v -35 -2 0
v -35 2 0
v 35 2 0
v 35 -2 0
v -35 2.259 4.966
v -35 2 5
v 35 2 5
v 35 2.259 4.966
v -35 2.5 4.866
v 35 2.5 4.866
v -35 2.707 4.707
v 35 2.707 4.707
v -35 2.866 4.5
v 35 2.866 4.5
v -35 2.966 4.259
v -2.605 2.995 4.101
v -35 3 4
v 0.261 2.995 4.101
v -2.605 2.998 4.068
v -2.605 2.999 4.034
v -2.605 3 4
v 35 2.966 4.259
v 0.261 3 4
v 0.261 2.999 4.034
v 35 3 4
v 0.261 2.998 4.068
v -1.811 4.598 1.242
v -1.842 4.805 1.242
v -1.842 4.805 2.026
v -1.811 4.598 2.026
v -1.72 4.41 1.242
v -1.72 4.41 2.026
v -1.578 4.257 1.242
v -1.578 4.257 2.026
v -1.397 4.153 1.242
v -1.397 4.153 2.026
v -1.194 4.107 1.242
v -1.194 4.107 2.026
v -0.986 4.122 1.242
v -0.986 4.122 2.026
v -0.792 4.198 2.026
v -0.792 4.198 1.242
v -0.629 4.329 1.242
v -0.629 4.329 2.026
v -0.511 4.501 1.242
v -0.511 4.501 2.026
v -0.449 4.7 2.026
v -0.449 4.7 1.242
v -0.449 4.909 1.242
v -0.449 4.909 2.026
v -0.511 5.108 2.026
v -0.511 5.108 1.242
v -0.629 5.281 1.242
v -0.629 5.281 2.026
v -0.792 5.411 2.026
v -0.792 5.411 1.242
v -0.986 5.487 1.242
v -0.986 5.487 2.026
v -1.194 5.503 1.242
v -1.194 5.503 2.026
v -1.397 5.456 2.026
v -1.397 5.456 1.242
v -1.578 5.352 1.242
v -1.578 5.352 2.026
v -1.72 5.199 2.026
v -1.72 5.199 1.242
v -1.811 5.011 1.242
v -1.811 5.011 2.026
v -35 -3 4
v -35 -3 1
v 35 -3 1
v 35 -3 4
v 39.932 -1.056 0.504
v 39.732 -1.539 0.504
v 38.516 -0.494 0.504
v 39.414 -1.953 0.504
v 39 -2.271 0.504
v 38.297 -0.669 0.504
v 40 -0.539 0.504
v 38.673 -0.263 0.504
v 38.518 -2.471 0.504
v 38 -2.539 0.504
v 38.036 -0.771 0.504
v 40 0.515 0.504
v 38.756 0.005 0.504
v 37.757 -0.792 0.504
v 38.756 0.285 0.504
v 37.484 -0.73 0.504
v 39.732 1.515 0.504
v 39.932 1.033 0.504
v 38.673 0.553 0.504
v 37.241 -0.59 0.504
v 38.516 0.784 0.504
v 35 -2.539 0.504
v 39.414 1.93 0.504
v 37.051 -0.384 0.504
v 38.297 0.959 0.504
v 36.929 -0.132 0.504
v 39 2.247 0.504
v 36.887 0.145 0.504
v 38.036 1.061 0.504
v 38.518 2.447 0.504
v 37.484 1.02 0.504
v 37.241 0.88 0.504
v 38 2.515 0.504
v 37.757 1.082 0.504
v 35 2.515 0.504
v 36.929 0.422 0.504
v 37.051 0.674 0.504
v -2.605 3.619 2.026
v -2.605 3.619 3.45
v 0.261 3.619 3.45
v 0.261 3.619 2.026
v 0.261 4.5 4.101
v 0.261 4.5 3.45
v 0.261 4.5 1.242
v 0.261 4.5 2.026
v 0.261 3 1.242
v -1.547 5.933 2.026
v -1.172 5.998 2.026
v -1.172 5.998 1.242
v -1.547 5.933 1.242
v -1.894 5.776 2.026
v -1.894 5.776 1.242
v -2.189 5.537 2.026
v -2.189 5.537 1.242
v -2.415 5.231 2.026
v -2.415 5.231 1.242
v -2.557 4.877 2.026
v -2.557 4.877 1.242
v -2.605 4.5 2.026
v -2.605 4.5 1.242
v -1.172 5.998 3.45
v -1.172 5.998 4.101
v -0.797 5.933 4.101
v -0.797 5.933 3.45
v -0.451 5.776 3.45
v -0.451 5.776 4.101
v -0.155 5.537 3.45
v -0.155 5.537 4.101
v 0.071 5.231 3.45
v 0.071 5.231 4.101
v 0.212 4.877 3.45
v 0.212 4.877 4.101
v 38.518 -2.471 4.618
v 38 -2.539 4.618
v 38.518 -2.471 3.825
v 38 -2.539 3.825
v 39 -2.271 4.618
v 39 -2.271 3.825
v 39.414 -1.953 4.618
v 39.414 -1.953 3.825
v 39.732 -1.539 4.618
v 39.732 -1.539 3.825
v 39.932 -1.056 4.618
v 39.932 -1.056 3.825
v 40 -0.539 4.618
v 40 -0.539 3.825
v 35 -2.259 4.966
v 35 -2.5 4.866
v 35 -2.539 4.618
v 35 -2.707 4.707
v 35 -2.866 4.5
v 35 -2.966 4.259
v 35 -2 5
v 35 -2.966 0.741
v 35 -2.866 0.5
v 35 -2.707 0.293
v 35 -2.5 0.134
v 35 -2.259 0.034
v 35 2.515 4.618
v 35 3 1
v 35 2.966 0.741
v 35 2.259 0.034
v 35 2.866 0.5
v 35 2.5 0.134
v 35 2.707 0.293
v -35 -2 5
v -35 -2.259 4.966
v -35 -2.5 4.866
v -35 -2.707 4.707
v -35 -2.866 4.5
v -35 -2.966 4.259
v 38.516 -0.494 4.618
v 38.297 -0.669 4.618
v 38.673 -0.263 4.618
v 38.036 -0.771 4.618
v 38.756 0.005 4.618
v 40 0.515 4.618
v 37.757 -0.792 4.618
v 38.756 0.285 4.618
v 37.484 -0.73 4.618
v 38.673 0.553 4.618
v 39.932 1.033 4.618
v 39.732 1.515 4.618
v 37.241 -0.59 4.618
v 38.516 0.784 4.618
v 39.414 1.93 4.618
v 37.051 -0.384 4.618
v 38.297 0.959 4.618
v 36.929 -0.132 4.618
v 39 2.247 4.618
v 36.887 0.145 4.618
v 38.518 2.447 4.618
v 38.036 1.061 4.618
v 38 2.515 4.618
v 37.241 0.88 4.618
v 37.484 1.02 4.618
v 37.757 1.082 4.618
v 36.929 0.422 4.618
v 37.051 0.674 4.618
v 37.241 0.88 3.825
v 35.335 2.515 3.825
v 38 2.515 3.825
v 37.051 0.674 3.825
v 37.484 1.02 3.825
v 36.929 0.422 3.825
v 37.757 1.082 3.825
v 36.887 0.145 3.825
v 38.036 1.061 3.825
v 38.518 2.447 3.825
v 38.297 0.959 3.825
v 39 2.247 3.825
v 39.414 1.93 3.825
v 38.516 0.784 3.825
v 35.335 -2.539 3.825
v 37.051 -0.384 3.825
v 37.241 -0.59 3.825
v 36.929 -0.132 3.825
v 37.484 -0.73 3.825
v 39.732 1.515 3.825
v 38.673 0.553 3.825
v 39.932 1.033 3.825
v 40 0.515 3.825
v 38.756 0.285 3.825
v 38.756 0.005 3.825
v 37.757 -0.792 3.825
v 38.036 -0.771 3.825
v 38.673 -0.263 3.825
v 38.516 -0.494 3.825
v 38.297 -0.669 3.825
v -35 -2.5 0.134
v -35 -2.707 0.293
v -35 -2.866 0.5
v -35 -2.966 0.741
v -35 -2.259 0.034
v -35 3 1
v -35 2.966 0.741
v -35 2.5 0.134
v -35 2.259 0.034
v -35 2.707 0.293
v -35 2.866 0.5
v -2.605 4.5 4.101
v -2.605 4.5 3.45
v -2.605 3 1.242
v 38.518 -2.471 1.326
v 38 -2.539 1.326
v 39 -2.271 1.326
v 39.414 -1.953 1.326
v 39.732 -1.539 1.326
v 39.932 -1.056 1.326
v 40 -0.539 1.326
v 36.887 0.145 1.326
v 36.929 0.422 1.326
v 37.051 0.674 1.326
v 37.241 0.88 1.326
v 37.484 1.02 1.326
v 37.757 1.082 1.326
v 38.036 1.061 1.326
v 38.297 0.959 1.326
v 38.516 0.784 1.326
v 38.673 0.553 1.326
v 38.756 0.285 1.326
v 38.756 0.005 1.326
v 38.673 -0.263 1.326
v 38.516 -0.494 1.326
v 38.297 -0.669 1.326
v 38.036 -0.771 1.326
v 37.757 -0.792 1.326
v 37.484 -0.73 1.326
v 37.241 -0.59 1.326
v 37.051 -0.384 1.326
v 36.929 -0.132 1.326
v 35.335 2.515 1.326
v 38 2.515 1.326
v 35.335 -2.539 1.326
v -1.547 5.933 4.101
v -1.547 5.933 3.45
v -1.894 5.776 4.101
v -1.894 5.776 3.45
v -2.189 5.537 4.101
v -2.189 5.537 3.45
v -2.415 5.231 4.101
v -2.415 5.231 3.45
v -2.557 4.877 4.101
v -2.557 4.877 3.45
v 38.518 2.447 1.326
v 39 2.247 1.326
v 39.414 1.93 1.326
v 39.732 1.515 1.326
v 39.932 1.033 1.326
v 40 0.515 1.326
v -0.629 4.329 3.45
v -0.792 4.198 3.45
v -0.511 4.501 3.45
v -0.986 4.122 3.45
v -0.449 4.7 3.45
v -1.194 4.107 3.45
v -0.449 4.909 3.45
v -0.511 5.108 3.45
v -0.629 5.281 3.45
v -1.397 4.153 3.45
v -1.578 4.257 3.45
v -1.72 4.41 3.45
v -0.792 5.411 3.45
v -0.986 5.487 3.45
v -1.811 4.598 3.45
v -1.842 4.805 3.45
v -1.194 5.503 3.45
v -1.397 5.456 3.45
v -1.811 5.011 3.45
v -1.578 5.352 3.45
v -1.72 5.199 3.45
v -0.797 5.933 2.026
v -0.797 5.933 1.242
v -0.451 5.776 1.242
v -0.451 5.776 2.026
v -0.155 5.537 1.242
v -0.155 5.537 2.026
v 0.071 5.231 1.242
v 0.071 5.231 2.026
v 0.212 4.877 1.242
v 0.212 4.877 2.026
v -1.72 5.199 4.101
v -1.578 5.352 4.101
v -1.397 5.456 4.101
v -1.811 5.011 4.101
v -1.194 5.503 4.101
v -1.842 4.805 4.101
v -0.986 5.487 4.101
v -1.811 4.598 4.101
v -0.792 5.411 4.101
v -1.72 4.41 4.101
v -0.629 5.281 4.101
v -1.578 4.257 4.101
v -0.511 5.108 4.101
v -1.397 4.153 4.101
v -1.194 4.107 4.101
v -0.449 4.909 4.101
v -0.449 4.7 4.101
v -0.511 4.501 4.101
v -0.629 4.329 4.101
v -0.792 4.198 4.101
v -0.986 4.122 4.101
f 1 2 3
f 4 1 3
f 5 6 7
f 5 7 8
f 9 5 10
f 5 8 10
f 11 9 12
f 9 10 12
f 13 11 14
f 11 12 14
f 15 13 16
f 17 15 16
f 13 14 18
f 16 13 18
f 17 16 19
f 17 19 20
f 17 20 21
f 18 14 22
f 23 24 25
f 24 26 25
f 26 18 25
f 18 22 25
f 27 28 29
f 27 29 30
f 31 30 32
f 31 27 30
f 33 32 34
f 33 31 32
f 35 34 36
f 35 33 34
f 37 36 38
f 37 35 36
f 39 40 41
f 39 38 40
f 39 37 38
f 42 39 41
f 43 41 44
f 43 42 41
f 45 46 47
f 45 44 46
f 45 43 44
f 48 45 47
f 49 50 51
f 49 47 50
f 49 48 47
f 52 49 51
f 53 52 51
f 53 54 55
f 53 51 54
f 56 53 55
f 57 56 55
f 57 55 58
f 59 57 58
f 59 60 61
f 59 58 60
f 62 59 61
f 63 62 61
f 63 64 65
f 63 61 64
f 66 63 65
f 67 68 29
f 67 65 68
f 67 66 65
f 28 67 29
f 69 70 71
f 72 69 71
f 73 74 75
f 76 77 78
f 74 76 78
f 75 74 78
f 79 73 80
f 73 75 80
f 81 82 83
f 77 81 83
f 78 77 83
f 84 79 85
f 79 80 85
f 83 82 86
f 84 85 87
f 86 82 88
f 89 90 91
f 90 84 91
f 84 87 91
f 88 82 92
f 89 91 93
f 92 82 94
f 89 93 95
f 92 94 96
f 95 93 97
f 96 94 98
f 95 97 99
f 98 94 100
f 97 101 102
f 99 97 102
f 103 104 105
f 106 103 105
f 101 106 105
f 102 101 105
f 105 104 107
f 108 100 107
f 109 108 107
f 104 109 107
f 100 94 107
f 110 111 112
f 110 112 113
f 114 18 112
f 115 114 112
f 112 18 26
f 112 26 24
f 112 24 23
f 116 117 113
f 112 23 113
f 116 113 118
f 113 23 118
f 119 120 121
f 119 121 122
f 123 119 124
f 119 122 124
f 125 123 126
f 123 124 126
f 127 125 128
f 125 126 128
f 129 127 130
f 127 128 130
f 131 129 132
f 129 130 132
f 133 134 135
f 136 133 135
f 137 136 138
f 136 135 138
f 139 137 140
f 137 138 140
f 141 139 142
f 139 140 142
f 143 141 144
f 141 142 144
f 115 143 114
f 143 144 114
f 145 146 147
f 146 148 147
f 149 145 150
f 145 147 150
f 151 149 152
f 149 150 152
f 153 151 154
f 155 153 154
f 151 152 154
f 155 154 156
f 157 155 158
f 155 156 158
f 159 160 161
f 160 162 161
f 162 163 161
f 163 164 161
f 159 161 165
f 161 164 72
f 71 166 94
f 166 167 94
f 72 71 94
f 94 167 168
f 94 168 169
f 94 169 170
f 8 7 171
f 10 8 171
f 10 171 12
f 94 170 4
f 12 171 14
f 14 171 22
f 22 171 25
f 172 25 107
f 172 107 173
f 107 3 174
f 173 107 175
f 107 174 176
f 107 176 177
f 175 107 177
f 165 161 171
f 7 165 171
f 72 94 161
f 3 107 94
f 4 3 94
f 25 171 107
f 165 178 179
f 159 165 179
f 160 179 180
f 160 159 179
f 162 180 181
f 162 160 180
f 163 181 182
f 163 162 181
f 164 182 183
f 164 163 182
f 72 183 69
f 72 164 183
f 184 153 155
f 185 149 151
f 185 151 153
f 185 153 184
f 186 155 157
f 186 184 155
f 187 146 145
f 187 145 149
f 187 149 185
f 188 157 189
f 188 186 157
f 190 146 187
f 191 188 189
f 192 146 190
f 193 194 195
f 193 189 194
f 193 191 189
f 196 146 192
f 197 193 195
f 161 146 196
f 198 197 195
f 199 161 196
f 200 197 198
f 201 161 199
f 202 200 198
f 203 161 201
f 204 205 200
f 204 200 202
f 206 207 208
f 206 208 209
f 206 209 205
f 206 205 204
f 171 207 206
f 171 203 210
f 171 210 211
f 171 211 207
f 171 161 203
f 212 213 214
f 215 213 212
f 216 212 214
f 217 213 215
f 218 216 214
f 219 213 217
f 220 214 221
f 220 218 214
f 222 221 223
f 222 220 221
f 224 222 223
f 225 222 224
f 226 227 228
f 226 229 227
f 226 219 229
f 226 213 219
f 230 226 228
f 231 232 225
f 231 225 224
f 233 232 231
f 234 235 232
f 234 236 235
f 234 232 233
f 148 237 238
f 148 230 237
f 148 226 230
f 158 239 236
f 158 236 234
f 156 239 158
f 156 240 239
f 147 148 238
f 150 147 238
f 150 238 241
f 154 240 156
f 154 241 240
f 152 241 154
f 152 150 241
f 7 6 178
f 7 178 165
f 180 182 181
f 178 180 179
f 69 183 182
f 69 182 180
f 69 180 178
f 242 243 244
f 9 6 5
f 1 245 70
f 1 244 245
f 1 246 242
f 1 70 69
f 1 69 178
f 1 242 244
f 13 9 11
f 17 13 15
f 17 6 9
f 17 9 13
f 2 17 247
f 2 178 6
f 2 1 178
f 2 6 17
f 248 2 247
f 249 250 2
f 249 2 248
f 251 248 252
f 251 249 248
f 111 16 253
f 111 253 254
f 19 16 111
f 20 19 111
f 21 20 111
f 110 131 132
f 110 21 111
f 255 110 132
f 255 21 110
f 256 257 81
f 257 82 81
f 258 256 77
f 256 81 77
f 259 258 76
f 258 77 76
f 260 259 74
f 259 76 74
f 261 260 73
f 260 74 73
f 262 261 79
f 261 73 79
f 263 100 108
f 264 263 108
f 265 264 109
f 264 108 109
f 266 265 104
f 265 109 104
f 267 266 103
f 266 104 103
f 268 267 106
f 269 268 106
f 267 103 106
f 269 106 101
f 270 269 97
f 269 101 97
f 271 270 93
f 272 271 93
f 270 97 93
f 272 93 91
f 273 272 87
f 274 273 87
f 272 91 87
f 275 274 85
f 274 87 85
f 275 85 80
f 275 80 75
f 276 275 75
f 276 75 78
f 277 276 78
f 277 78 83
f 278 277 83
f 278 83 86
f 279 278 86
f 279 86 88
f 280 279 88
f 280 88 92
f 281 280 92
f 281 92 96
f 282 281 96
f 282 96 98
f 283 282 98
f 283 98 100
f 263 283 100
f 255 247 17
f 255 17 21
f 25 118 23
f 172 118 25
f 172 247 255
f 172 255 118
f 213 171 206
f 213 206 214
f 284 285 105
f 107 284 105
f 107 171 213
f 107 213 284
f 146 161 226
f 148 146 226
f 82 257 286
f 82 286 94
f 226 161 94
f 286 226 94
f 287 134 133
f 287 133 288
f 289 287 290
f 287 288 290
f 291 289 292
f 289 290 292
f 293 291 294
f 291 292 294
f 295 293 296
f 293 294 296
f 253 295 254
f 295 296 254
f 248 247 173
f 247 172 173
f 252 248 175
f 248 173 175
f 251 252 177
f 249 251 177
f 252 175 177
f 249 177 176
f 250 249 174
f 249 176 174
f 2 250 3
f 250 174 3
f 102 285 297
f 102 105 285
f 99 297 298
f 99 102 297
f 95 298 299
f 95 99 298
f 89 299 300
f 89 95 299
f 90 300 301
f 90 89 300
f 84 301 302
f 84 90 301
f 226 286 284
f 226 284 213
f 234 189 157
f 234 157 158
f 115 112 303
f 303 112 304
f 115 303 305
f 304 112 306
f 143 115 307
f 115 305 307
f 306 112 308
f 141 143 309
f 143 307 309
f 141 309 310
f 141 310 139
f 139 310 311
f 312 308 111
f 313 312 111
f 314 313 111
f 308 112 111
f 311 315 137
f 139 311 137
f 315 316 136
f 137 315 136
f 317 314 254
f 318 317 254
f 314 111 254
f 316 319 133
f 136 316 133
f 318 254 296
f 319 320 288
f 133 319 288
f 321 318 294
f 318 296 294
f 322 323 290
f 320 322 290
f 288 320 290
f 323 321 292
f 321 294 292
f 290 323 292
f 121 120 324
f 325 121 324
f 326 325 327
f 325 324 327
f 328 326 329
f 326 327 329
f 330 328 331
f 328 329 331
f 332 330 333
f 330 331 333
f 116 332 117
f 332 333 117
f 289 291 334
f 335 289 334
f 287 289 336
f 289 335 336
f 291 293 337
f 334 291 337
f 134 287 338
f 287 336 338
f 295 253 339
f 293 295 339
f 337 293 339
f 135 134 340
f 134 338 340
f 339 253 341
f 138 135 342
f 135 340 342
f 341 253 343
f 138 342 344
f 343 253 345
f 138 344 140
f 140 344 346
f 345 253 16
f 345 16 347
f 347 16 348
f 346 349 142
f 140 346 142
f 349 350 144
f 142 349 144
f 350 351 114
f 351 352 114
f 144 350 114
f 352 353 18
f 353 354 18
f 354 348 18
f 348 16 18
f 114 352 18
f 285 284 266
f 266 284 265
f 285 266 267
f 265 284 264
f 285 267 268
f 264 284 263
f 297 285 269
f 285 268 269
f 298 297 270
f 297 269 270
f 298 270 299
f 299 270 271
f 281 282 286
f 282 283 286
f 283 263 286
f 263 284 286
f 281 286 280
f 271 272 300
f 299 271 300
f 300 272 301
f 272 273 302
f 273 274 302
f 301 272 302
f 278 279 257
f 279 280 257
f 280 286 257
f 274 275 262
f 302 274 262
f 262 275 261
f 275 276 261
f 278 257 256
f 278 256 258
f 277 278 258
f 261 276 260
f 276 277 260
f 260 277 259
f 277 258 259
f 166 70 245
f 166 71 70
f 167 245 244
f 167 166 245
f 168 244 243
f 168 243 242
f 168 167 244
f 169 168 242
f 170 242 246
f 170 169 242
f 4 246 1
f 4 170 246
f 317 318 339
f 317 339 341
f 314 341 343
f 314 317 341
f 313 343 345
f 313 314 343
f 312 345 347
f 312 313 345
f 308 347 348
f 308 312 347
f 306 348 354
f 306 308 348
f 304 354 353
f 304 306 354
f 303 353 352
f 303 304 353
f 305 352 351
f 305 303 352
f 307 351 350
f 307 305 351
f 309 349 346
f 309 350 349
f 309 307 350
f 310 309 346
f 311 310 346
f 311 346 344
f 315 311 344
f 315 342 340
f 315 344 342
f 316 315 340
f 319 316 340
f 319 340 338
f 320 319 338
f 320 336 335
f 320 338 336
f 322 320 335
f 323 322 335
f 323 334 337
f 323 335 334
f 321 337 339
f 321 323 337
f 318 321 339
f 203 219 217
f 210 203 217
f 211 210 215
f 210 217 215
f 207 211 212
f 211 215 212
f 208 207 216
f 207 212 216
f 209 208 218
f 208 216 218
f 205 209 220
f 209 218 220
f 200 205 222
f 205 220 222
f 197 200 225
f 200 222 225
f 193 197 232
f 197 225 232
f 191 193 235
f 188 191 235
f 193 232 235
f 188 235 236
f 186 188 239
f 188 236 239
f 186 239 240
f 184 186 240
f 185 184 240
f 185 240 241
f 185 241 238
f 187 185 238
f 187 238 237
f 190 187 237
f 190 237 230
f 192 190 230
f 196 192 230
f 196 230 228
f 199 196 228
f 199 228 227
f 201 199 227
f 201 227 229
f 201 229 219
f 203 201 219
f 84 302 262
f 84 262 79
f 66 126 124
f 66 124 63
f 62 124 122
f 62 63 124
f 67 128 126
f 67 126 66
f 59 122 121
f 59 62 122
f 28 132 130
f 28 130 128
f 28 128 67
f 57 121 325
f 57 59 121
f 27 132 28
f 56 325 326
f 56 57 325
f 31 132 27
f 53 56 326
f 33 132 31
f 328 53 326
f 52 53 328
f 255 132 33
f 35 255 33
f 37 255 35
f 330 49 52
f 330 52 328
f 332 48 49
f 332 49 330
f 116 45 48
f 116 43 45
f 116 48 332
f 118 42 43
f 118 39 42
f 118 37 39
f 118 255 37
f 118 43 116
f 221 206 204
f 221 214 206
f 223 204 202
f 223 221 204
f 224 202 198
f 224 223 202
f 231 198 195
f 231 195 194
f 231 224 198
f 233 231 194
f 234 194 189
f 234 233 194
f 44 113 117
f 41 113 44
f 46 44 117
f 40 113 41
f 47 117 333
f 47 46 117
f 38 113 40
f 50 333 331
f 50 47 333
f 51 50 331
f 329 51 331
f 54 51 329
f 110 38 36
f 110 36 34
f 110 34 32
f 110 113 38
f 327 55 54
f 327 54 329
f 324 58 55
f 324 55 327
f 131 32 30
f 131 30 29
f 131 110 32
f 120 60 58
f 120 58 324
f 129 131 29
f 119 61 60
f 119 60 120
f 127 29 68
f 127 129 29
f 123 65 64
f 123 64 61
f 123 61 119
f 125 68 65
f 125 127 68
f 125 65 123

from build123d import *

# Parameters (mm, degrees)
SKETCH1_W               = 70
SKETCH1_H               = 6
BOSS_EXTRUDE1_DEPTH     = 5
SKETCH5_W               = 4.113429611
SKETCH5_H               = 5.054148352
BOSS_EXTRUDE4_DEPTH     = 40
SKETCH9_W               = 5.188919622
SKETCH9_H               = 2.498562964
CUT_EXTRUDE6_DEPTH      = 6
FILLET14_R              = 1
FILLET15_R              = 1
SKETCH11_R              = 0.939549209
CUT_EXTRUDE8_DEPTH      = 6
FILLET19_R              = 2
SKETCH12_W              = 2.865541581
SKETCH12_H              = 2.859268941
BOSS_EXTRUDE5_DEPTH     = 6
CUT_EXTRUDE9_DEPTH      = 12
CUT_EXTRUDE9_DEPTH_BACK = 5
SKETCH13_W              = 1.424860979
SKETCH13_H              = 2.636738839
SKETCH14_R              = 0.7
CUT_EXTRUDE10_DEPTH     = 13
FILLET20_R              = 1.5


with BuildPart() as part:
    # Sketch1 → Boss-Extrude1 (new body)
    with BuildSketch(Plane.XY):
        Rectangle(SKETCH1_W, SKETCH1_H)
    extrude(amount=BOSS_EXTRUDE1_DEPTH)

    # Sketch5 → Boss-Extrude4 (add)
    with BuildSketch(Plane(origin=(0, 0, 0), x_dir=(0, 0, -1), z_dir=(1, 0, 0))):
        with Locations((-2.56083925, -0.011702819)):
            Rectangle(SKETCH5_W, SKETCH5_H)
    extrude(amount=BOSS_EXTRUDE4_DEPTH)

    # Sketch9 → Cut-Extrude6 (cut)
    with BuildSketch(Plane.XZ.offset(2.538776995)):
        with Locations((37.929941449, 2.575384926)):
            Rectangle(SKETCH9_W, SKETCH9_H)
    extrude(amount=-CUT_EXTRUDE6_DEPTH, mode=Mode.SUBTRACT)

    # Fillet14
    fillet14_edges = [part.edges().sort_by_distance(p)[0] for p in [
        (0, 3, 5),
    ]]
    fillet(fillet14_edges, radius=FILLET14_R)

    # Fillet15
    fillet15_edges = [part.edges().sort_by_distance(p)[0] for p in [
        (0, -3, 5),
        (0, -3, 0),
        (0, 3, 0),
    ]]
    fillet(fillet15_edges, radius=FILLET15_R)

    # Sketch11 → Cut-Extrude8 (cut)
    with BuildSketch(Plane(origin=(0, 0, 0.504124444), x_dir=(-1, 0, 0), z_dir=(0, 0, -1))):
        with Locations((-37.826949183, 0.145030674)):
            Circle(SKETCH11_R)
    extrude(amount=-CUT_EXTRUDE8_DEPTH, mode=Mode.SUBTRACT)

    # Fillet19
    fillet19_edges = [part.edges().sort_by_distance(p)[0] for p in [
        (40, 2.515371357, 0.915113944),
        (40, -2.538776995, 4.221110231),
        (40, 2.515371357, 4.221110231),
        (40, -2.538776995, 0.915113944),
    ]]
    fillet(fillet19_edges, radius=FILLET19_R)

    # Sketch12 → Boss-Extrude5 (add)
    with BuildSketch(Plane(origin=(0, 0, 0), x_dir=(1, 0, 0), z_dir=(0, 1, 0))):
        with Locations((-1.172253324, -2.671686226)):
            Rectangle(SKETCH12_W, SKETCH12_H)
    extrude(amount=BOSS_EXTRUDE5_DEPTH)

    # Sketch13 → Cut-Extrude9 (cut, two sides: drawn at the far end of the back side and taken through both)
    with BuildSketch(Plane(origin=(0, 0, 0), x_dir=(0, 0, -1), z_dir=(1, 0, 0)).offset(-CUT_EXTRUDE9_DEPTH_BACK)):
        with Locations((-2.737982633, 4.937385392)):
            Rectangle(SKETCH13_W, SKETCH13_H)
    extrude(amount=CUT_EXTRUDE9_DEPTH + CUT_EXTRUDE9_DEPTH_BACK, mode=Mode.SUBTRACT)

    # Sketch14 → Cut-Extrude10 (cut)
    with BuildSketch(Plane.XY):
        with Locations(Location((-1.141664566, 4.804714943, 0), (0, 0, 180))):
            Circle(SKETCH14_R)
    extrude(amount=CUT_EXTRUDE10_DEPTH, mode=Mode.SUBTRACT)

    # Fillet20
    # the kernel refuses this fillet: 1.5 mm, written as the material it takes off along each edge
    with BuildSketch(Plane(origin=(0.260517466, 6, 7.851320696), x_dir=(0, -1, 0), z_dir=(0, 0, -1)), Plane(origin=(-2.605024115, 6, -0.299586878), x_dir=(0, -1, 0), z_dir=(0, 0, 1))) as fillet20_piece_1:
        with BuildLine():
            CenterArc((FILLET20_R, FILLET20_R), FILLET20_R, 180, 90)
            Line((0, FILLET20_R), (0, 0))
            Line((0, 0), (FILLET20_R, 0))
        make_face()
    extrude(amount=8.150907574, mode=Mode.SUBTRACT)
    with BuildSketch(Plane(origin=(0.260517466, 6, 5.775552143), x_dir=(0, -1, 0), z_dir=(0, 0, -1)), Plane(origin=(-2.605024115, 6, -2.507948245), x_dir=(0, -1, 0), z_dir=(0, 0, 1))) as fillet20_piece_2:
        with BuildLine():
            CenterArc((FILLET20_R, FILLET20_R), FILLET20_R, 180, 90)
            Line((0, FILLET20_R), (0, 0))
            Line((0, 0), (FILLET20_R, 0))
        make_face()
    extrude(amount=8.283500388, mode=Mode.SUBTRACT)


solid = part.part
